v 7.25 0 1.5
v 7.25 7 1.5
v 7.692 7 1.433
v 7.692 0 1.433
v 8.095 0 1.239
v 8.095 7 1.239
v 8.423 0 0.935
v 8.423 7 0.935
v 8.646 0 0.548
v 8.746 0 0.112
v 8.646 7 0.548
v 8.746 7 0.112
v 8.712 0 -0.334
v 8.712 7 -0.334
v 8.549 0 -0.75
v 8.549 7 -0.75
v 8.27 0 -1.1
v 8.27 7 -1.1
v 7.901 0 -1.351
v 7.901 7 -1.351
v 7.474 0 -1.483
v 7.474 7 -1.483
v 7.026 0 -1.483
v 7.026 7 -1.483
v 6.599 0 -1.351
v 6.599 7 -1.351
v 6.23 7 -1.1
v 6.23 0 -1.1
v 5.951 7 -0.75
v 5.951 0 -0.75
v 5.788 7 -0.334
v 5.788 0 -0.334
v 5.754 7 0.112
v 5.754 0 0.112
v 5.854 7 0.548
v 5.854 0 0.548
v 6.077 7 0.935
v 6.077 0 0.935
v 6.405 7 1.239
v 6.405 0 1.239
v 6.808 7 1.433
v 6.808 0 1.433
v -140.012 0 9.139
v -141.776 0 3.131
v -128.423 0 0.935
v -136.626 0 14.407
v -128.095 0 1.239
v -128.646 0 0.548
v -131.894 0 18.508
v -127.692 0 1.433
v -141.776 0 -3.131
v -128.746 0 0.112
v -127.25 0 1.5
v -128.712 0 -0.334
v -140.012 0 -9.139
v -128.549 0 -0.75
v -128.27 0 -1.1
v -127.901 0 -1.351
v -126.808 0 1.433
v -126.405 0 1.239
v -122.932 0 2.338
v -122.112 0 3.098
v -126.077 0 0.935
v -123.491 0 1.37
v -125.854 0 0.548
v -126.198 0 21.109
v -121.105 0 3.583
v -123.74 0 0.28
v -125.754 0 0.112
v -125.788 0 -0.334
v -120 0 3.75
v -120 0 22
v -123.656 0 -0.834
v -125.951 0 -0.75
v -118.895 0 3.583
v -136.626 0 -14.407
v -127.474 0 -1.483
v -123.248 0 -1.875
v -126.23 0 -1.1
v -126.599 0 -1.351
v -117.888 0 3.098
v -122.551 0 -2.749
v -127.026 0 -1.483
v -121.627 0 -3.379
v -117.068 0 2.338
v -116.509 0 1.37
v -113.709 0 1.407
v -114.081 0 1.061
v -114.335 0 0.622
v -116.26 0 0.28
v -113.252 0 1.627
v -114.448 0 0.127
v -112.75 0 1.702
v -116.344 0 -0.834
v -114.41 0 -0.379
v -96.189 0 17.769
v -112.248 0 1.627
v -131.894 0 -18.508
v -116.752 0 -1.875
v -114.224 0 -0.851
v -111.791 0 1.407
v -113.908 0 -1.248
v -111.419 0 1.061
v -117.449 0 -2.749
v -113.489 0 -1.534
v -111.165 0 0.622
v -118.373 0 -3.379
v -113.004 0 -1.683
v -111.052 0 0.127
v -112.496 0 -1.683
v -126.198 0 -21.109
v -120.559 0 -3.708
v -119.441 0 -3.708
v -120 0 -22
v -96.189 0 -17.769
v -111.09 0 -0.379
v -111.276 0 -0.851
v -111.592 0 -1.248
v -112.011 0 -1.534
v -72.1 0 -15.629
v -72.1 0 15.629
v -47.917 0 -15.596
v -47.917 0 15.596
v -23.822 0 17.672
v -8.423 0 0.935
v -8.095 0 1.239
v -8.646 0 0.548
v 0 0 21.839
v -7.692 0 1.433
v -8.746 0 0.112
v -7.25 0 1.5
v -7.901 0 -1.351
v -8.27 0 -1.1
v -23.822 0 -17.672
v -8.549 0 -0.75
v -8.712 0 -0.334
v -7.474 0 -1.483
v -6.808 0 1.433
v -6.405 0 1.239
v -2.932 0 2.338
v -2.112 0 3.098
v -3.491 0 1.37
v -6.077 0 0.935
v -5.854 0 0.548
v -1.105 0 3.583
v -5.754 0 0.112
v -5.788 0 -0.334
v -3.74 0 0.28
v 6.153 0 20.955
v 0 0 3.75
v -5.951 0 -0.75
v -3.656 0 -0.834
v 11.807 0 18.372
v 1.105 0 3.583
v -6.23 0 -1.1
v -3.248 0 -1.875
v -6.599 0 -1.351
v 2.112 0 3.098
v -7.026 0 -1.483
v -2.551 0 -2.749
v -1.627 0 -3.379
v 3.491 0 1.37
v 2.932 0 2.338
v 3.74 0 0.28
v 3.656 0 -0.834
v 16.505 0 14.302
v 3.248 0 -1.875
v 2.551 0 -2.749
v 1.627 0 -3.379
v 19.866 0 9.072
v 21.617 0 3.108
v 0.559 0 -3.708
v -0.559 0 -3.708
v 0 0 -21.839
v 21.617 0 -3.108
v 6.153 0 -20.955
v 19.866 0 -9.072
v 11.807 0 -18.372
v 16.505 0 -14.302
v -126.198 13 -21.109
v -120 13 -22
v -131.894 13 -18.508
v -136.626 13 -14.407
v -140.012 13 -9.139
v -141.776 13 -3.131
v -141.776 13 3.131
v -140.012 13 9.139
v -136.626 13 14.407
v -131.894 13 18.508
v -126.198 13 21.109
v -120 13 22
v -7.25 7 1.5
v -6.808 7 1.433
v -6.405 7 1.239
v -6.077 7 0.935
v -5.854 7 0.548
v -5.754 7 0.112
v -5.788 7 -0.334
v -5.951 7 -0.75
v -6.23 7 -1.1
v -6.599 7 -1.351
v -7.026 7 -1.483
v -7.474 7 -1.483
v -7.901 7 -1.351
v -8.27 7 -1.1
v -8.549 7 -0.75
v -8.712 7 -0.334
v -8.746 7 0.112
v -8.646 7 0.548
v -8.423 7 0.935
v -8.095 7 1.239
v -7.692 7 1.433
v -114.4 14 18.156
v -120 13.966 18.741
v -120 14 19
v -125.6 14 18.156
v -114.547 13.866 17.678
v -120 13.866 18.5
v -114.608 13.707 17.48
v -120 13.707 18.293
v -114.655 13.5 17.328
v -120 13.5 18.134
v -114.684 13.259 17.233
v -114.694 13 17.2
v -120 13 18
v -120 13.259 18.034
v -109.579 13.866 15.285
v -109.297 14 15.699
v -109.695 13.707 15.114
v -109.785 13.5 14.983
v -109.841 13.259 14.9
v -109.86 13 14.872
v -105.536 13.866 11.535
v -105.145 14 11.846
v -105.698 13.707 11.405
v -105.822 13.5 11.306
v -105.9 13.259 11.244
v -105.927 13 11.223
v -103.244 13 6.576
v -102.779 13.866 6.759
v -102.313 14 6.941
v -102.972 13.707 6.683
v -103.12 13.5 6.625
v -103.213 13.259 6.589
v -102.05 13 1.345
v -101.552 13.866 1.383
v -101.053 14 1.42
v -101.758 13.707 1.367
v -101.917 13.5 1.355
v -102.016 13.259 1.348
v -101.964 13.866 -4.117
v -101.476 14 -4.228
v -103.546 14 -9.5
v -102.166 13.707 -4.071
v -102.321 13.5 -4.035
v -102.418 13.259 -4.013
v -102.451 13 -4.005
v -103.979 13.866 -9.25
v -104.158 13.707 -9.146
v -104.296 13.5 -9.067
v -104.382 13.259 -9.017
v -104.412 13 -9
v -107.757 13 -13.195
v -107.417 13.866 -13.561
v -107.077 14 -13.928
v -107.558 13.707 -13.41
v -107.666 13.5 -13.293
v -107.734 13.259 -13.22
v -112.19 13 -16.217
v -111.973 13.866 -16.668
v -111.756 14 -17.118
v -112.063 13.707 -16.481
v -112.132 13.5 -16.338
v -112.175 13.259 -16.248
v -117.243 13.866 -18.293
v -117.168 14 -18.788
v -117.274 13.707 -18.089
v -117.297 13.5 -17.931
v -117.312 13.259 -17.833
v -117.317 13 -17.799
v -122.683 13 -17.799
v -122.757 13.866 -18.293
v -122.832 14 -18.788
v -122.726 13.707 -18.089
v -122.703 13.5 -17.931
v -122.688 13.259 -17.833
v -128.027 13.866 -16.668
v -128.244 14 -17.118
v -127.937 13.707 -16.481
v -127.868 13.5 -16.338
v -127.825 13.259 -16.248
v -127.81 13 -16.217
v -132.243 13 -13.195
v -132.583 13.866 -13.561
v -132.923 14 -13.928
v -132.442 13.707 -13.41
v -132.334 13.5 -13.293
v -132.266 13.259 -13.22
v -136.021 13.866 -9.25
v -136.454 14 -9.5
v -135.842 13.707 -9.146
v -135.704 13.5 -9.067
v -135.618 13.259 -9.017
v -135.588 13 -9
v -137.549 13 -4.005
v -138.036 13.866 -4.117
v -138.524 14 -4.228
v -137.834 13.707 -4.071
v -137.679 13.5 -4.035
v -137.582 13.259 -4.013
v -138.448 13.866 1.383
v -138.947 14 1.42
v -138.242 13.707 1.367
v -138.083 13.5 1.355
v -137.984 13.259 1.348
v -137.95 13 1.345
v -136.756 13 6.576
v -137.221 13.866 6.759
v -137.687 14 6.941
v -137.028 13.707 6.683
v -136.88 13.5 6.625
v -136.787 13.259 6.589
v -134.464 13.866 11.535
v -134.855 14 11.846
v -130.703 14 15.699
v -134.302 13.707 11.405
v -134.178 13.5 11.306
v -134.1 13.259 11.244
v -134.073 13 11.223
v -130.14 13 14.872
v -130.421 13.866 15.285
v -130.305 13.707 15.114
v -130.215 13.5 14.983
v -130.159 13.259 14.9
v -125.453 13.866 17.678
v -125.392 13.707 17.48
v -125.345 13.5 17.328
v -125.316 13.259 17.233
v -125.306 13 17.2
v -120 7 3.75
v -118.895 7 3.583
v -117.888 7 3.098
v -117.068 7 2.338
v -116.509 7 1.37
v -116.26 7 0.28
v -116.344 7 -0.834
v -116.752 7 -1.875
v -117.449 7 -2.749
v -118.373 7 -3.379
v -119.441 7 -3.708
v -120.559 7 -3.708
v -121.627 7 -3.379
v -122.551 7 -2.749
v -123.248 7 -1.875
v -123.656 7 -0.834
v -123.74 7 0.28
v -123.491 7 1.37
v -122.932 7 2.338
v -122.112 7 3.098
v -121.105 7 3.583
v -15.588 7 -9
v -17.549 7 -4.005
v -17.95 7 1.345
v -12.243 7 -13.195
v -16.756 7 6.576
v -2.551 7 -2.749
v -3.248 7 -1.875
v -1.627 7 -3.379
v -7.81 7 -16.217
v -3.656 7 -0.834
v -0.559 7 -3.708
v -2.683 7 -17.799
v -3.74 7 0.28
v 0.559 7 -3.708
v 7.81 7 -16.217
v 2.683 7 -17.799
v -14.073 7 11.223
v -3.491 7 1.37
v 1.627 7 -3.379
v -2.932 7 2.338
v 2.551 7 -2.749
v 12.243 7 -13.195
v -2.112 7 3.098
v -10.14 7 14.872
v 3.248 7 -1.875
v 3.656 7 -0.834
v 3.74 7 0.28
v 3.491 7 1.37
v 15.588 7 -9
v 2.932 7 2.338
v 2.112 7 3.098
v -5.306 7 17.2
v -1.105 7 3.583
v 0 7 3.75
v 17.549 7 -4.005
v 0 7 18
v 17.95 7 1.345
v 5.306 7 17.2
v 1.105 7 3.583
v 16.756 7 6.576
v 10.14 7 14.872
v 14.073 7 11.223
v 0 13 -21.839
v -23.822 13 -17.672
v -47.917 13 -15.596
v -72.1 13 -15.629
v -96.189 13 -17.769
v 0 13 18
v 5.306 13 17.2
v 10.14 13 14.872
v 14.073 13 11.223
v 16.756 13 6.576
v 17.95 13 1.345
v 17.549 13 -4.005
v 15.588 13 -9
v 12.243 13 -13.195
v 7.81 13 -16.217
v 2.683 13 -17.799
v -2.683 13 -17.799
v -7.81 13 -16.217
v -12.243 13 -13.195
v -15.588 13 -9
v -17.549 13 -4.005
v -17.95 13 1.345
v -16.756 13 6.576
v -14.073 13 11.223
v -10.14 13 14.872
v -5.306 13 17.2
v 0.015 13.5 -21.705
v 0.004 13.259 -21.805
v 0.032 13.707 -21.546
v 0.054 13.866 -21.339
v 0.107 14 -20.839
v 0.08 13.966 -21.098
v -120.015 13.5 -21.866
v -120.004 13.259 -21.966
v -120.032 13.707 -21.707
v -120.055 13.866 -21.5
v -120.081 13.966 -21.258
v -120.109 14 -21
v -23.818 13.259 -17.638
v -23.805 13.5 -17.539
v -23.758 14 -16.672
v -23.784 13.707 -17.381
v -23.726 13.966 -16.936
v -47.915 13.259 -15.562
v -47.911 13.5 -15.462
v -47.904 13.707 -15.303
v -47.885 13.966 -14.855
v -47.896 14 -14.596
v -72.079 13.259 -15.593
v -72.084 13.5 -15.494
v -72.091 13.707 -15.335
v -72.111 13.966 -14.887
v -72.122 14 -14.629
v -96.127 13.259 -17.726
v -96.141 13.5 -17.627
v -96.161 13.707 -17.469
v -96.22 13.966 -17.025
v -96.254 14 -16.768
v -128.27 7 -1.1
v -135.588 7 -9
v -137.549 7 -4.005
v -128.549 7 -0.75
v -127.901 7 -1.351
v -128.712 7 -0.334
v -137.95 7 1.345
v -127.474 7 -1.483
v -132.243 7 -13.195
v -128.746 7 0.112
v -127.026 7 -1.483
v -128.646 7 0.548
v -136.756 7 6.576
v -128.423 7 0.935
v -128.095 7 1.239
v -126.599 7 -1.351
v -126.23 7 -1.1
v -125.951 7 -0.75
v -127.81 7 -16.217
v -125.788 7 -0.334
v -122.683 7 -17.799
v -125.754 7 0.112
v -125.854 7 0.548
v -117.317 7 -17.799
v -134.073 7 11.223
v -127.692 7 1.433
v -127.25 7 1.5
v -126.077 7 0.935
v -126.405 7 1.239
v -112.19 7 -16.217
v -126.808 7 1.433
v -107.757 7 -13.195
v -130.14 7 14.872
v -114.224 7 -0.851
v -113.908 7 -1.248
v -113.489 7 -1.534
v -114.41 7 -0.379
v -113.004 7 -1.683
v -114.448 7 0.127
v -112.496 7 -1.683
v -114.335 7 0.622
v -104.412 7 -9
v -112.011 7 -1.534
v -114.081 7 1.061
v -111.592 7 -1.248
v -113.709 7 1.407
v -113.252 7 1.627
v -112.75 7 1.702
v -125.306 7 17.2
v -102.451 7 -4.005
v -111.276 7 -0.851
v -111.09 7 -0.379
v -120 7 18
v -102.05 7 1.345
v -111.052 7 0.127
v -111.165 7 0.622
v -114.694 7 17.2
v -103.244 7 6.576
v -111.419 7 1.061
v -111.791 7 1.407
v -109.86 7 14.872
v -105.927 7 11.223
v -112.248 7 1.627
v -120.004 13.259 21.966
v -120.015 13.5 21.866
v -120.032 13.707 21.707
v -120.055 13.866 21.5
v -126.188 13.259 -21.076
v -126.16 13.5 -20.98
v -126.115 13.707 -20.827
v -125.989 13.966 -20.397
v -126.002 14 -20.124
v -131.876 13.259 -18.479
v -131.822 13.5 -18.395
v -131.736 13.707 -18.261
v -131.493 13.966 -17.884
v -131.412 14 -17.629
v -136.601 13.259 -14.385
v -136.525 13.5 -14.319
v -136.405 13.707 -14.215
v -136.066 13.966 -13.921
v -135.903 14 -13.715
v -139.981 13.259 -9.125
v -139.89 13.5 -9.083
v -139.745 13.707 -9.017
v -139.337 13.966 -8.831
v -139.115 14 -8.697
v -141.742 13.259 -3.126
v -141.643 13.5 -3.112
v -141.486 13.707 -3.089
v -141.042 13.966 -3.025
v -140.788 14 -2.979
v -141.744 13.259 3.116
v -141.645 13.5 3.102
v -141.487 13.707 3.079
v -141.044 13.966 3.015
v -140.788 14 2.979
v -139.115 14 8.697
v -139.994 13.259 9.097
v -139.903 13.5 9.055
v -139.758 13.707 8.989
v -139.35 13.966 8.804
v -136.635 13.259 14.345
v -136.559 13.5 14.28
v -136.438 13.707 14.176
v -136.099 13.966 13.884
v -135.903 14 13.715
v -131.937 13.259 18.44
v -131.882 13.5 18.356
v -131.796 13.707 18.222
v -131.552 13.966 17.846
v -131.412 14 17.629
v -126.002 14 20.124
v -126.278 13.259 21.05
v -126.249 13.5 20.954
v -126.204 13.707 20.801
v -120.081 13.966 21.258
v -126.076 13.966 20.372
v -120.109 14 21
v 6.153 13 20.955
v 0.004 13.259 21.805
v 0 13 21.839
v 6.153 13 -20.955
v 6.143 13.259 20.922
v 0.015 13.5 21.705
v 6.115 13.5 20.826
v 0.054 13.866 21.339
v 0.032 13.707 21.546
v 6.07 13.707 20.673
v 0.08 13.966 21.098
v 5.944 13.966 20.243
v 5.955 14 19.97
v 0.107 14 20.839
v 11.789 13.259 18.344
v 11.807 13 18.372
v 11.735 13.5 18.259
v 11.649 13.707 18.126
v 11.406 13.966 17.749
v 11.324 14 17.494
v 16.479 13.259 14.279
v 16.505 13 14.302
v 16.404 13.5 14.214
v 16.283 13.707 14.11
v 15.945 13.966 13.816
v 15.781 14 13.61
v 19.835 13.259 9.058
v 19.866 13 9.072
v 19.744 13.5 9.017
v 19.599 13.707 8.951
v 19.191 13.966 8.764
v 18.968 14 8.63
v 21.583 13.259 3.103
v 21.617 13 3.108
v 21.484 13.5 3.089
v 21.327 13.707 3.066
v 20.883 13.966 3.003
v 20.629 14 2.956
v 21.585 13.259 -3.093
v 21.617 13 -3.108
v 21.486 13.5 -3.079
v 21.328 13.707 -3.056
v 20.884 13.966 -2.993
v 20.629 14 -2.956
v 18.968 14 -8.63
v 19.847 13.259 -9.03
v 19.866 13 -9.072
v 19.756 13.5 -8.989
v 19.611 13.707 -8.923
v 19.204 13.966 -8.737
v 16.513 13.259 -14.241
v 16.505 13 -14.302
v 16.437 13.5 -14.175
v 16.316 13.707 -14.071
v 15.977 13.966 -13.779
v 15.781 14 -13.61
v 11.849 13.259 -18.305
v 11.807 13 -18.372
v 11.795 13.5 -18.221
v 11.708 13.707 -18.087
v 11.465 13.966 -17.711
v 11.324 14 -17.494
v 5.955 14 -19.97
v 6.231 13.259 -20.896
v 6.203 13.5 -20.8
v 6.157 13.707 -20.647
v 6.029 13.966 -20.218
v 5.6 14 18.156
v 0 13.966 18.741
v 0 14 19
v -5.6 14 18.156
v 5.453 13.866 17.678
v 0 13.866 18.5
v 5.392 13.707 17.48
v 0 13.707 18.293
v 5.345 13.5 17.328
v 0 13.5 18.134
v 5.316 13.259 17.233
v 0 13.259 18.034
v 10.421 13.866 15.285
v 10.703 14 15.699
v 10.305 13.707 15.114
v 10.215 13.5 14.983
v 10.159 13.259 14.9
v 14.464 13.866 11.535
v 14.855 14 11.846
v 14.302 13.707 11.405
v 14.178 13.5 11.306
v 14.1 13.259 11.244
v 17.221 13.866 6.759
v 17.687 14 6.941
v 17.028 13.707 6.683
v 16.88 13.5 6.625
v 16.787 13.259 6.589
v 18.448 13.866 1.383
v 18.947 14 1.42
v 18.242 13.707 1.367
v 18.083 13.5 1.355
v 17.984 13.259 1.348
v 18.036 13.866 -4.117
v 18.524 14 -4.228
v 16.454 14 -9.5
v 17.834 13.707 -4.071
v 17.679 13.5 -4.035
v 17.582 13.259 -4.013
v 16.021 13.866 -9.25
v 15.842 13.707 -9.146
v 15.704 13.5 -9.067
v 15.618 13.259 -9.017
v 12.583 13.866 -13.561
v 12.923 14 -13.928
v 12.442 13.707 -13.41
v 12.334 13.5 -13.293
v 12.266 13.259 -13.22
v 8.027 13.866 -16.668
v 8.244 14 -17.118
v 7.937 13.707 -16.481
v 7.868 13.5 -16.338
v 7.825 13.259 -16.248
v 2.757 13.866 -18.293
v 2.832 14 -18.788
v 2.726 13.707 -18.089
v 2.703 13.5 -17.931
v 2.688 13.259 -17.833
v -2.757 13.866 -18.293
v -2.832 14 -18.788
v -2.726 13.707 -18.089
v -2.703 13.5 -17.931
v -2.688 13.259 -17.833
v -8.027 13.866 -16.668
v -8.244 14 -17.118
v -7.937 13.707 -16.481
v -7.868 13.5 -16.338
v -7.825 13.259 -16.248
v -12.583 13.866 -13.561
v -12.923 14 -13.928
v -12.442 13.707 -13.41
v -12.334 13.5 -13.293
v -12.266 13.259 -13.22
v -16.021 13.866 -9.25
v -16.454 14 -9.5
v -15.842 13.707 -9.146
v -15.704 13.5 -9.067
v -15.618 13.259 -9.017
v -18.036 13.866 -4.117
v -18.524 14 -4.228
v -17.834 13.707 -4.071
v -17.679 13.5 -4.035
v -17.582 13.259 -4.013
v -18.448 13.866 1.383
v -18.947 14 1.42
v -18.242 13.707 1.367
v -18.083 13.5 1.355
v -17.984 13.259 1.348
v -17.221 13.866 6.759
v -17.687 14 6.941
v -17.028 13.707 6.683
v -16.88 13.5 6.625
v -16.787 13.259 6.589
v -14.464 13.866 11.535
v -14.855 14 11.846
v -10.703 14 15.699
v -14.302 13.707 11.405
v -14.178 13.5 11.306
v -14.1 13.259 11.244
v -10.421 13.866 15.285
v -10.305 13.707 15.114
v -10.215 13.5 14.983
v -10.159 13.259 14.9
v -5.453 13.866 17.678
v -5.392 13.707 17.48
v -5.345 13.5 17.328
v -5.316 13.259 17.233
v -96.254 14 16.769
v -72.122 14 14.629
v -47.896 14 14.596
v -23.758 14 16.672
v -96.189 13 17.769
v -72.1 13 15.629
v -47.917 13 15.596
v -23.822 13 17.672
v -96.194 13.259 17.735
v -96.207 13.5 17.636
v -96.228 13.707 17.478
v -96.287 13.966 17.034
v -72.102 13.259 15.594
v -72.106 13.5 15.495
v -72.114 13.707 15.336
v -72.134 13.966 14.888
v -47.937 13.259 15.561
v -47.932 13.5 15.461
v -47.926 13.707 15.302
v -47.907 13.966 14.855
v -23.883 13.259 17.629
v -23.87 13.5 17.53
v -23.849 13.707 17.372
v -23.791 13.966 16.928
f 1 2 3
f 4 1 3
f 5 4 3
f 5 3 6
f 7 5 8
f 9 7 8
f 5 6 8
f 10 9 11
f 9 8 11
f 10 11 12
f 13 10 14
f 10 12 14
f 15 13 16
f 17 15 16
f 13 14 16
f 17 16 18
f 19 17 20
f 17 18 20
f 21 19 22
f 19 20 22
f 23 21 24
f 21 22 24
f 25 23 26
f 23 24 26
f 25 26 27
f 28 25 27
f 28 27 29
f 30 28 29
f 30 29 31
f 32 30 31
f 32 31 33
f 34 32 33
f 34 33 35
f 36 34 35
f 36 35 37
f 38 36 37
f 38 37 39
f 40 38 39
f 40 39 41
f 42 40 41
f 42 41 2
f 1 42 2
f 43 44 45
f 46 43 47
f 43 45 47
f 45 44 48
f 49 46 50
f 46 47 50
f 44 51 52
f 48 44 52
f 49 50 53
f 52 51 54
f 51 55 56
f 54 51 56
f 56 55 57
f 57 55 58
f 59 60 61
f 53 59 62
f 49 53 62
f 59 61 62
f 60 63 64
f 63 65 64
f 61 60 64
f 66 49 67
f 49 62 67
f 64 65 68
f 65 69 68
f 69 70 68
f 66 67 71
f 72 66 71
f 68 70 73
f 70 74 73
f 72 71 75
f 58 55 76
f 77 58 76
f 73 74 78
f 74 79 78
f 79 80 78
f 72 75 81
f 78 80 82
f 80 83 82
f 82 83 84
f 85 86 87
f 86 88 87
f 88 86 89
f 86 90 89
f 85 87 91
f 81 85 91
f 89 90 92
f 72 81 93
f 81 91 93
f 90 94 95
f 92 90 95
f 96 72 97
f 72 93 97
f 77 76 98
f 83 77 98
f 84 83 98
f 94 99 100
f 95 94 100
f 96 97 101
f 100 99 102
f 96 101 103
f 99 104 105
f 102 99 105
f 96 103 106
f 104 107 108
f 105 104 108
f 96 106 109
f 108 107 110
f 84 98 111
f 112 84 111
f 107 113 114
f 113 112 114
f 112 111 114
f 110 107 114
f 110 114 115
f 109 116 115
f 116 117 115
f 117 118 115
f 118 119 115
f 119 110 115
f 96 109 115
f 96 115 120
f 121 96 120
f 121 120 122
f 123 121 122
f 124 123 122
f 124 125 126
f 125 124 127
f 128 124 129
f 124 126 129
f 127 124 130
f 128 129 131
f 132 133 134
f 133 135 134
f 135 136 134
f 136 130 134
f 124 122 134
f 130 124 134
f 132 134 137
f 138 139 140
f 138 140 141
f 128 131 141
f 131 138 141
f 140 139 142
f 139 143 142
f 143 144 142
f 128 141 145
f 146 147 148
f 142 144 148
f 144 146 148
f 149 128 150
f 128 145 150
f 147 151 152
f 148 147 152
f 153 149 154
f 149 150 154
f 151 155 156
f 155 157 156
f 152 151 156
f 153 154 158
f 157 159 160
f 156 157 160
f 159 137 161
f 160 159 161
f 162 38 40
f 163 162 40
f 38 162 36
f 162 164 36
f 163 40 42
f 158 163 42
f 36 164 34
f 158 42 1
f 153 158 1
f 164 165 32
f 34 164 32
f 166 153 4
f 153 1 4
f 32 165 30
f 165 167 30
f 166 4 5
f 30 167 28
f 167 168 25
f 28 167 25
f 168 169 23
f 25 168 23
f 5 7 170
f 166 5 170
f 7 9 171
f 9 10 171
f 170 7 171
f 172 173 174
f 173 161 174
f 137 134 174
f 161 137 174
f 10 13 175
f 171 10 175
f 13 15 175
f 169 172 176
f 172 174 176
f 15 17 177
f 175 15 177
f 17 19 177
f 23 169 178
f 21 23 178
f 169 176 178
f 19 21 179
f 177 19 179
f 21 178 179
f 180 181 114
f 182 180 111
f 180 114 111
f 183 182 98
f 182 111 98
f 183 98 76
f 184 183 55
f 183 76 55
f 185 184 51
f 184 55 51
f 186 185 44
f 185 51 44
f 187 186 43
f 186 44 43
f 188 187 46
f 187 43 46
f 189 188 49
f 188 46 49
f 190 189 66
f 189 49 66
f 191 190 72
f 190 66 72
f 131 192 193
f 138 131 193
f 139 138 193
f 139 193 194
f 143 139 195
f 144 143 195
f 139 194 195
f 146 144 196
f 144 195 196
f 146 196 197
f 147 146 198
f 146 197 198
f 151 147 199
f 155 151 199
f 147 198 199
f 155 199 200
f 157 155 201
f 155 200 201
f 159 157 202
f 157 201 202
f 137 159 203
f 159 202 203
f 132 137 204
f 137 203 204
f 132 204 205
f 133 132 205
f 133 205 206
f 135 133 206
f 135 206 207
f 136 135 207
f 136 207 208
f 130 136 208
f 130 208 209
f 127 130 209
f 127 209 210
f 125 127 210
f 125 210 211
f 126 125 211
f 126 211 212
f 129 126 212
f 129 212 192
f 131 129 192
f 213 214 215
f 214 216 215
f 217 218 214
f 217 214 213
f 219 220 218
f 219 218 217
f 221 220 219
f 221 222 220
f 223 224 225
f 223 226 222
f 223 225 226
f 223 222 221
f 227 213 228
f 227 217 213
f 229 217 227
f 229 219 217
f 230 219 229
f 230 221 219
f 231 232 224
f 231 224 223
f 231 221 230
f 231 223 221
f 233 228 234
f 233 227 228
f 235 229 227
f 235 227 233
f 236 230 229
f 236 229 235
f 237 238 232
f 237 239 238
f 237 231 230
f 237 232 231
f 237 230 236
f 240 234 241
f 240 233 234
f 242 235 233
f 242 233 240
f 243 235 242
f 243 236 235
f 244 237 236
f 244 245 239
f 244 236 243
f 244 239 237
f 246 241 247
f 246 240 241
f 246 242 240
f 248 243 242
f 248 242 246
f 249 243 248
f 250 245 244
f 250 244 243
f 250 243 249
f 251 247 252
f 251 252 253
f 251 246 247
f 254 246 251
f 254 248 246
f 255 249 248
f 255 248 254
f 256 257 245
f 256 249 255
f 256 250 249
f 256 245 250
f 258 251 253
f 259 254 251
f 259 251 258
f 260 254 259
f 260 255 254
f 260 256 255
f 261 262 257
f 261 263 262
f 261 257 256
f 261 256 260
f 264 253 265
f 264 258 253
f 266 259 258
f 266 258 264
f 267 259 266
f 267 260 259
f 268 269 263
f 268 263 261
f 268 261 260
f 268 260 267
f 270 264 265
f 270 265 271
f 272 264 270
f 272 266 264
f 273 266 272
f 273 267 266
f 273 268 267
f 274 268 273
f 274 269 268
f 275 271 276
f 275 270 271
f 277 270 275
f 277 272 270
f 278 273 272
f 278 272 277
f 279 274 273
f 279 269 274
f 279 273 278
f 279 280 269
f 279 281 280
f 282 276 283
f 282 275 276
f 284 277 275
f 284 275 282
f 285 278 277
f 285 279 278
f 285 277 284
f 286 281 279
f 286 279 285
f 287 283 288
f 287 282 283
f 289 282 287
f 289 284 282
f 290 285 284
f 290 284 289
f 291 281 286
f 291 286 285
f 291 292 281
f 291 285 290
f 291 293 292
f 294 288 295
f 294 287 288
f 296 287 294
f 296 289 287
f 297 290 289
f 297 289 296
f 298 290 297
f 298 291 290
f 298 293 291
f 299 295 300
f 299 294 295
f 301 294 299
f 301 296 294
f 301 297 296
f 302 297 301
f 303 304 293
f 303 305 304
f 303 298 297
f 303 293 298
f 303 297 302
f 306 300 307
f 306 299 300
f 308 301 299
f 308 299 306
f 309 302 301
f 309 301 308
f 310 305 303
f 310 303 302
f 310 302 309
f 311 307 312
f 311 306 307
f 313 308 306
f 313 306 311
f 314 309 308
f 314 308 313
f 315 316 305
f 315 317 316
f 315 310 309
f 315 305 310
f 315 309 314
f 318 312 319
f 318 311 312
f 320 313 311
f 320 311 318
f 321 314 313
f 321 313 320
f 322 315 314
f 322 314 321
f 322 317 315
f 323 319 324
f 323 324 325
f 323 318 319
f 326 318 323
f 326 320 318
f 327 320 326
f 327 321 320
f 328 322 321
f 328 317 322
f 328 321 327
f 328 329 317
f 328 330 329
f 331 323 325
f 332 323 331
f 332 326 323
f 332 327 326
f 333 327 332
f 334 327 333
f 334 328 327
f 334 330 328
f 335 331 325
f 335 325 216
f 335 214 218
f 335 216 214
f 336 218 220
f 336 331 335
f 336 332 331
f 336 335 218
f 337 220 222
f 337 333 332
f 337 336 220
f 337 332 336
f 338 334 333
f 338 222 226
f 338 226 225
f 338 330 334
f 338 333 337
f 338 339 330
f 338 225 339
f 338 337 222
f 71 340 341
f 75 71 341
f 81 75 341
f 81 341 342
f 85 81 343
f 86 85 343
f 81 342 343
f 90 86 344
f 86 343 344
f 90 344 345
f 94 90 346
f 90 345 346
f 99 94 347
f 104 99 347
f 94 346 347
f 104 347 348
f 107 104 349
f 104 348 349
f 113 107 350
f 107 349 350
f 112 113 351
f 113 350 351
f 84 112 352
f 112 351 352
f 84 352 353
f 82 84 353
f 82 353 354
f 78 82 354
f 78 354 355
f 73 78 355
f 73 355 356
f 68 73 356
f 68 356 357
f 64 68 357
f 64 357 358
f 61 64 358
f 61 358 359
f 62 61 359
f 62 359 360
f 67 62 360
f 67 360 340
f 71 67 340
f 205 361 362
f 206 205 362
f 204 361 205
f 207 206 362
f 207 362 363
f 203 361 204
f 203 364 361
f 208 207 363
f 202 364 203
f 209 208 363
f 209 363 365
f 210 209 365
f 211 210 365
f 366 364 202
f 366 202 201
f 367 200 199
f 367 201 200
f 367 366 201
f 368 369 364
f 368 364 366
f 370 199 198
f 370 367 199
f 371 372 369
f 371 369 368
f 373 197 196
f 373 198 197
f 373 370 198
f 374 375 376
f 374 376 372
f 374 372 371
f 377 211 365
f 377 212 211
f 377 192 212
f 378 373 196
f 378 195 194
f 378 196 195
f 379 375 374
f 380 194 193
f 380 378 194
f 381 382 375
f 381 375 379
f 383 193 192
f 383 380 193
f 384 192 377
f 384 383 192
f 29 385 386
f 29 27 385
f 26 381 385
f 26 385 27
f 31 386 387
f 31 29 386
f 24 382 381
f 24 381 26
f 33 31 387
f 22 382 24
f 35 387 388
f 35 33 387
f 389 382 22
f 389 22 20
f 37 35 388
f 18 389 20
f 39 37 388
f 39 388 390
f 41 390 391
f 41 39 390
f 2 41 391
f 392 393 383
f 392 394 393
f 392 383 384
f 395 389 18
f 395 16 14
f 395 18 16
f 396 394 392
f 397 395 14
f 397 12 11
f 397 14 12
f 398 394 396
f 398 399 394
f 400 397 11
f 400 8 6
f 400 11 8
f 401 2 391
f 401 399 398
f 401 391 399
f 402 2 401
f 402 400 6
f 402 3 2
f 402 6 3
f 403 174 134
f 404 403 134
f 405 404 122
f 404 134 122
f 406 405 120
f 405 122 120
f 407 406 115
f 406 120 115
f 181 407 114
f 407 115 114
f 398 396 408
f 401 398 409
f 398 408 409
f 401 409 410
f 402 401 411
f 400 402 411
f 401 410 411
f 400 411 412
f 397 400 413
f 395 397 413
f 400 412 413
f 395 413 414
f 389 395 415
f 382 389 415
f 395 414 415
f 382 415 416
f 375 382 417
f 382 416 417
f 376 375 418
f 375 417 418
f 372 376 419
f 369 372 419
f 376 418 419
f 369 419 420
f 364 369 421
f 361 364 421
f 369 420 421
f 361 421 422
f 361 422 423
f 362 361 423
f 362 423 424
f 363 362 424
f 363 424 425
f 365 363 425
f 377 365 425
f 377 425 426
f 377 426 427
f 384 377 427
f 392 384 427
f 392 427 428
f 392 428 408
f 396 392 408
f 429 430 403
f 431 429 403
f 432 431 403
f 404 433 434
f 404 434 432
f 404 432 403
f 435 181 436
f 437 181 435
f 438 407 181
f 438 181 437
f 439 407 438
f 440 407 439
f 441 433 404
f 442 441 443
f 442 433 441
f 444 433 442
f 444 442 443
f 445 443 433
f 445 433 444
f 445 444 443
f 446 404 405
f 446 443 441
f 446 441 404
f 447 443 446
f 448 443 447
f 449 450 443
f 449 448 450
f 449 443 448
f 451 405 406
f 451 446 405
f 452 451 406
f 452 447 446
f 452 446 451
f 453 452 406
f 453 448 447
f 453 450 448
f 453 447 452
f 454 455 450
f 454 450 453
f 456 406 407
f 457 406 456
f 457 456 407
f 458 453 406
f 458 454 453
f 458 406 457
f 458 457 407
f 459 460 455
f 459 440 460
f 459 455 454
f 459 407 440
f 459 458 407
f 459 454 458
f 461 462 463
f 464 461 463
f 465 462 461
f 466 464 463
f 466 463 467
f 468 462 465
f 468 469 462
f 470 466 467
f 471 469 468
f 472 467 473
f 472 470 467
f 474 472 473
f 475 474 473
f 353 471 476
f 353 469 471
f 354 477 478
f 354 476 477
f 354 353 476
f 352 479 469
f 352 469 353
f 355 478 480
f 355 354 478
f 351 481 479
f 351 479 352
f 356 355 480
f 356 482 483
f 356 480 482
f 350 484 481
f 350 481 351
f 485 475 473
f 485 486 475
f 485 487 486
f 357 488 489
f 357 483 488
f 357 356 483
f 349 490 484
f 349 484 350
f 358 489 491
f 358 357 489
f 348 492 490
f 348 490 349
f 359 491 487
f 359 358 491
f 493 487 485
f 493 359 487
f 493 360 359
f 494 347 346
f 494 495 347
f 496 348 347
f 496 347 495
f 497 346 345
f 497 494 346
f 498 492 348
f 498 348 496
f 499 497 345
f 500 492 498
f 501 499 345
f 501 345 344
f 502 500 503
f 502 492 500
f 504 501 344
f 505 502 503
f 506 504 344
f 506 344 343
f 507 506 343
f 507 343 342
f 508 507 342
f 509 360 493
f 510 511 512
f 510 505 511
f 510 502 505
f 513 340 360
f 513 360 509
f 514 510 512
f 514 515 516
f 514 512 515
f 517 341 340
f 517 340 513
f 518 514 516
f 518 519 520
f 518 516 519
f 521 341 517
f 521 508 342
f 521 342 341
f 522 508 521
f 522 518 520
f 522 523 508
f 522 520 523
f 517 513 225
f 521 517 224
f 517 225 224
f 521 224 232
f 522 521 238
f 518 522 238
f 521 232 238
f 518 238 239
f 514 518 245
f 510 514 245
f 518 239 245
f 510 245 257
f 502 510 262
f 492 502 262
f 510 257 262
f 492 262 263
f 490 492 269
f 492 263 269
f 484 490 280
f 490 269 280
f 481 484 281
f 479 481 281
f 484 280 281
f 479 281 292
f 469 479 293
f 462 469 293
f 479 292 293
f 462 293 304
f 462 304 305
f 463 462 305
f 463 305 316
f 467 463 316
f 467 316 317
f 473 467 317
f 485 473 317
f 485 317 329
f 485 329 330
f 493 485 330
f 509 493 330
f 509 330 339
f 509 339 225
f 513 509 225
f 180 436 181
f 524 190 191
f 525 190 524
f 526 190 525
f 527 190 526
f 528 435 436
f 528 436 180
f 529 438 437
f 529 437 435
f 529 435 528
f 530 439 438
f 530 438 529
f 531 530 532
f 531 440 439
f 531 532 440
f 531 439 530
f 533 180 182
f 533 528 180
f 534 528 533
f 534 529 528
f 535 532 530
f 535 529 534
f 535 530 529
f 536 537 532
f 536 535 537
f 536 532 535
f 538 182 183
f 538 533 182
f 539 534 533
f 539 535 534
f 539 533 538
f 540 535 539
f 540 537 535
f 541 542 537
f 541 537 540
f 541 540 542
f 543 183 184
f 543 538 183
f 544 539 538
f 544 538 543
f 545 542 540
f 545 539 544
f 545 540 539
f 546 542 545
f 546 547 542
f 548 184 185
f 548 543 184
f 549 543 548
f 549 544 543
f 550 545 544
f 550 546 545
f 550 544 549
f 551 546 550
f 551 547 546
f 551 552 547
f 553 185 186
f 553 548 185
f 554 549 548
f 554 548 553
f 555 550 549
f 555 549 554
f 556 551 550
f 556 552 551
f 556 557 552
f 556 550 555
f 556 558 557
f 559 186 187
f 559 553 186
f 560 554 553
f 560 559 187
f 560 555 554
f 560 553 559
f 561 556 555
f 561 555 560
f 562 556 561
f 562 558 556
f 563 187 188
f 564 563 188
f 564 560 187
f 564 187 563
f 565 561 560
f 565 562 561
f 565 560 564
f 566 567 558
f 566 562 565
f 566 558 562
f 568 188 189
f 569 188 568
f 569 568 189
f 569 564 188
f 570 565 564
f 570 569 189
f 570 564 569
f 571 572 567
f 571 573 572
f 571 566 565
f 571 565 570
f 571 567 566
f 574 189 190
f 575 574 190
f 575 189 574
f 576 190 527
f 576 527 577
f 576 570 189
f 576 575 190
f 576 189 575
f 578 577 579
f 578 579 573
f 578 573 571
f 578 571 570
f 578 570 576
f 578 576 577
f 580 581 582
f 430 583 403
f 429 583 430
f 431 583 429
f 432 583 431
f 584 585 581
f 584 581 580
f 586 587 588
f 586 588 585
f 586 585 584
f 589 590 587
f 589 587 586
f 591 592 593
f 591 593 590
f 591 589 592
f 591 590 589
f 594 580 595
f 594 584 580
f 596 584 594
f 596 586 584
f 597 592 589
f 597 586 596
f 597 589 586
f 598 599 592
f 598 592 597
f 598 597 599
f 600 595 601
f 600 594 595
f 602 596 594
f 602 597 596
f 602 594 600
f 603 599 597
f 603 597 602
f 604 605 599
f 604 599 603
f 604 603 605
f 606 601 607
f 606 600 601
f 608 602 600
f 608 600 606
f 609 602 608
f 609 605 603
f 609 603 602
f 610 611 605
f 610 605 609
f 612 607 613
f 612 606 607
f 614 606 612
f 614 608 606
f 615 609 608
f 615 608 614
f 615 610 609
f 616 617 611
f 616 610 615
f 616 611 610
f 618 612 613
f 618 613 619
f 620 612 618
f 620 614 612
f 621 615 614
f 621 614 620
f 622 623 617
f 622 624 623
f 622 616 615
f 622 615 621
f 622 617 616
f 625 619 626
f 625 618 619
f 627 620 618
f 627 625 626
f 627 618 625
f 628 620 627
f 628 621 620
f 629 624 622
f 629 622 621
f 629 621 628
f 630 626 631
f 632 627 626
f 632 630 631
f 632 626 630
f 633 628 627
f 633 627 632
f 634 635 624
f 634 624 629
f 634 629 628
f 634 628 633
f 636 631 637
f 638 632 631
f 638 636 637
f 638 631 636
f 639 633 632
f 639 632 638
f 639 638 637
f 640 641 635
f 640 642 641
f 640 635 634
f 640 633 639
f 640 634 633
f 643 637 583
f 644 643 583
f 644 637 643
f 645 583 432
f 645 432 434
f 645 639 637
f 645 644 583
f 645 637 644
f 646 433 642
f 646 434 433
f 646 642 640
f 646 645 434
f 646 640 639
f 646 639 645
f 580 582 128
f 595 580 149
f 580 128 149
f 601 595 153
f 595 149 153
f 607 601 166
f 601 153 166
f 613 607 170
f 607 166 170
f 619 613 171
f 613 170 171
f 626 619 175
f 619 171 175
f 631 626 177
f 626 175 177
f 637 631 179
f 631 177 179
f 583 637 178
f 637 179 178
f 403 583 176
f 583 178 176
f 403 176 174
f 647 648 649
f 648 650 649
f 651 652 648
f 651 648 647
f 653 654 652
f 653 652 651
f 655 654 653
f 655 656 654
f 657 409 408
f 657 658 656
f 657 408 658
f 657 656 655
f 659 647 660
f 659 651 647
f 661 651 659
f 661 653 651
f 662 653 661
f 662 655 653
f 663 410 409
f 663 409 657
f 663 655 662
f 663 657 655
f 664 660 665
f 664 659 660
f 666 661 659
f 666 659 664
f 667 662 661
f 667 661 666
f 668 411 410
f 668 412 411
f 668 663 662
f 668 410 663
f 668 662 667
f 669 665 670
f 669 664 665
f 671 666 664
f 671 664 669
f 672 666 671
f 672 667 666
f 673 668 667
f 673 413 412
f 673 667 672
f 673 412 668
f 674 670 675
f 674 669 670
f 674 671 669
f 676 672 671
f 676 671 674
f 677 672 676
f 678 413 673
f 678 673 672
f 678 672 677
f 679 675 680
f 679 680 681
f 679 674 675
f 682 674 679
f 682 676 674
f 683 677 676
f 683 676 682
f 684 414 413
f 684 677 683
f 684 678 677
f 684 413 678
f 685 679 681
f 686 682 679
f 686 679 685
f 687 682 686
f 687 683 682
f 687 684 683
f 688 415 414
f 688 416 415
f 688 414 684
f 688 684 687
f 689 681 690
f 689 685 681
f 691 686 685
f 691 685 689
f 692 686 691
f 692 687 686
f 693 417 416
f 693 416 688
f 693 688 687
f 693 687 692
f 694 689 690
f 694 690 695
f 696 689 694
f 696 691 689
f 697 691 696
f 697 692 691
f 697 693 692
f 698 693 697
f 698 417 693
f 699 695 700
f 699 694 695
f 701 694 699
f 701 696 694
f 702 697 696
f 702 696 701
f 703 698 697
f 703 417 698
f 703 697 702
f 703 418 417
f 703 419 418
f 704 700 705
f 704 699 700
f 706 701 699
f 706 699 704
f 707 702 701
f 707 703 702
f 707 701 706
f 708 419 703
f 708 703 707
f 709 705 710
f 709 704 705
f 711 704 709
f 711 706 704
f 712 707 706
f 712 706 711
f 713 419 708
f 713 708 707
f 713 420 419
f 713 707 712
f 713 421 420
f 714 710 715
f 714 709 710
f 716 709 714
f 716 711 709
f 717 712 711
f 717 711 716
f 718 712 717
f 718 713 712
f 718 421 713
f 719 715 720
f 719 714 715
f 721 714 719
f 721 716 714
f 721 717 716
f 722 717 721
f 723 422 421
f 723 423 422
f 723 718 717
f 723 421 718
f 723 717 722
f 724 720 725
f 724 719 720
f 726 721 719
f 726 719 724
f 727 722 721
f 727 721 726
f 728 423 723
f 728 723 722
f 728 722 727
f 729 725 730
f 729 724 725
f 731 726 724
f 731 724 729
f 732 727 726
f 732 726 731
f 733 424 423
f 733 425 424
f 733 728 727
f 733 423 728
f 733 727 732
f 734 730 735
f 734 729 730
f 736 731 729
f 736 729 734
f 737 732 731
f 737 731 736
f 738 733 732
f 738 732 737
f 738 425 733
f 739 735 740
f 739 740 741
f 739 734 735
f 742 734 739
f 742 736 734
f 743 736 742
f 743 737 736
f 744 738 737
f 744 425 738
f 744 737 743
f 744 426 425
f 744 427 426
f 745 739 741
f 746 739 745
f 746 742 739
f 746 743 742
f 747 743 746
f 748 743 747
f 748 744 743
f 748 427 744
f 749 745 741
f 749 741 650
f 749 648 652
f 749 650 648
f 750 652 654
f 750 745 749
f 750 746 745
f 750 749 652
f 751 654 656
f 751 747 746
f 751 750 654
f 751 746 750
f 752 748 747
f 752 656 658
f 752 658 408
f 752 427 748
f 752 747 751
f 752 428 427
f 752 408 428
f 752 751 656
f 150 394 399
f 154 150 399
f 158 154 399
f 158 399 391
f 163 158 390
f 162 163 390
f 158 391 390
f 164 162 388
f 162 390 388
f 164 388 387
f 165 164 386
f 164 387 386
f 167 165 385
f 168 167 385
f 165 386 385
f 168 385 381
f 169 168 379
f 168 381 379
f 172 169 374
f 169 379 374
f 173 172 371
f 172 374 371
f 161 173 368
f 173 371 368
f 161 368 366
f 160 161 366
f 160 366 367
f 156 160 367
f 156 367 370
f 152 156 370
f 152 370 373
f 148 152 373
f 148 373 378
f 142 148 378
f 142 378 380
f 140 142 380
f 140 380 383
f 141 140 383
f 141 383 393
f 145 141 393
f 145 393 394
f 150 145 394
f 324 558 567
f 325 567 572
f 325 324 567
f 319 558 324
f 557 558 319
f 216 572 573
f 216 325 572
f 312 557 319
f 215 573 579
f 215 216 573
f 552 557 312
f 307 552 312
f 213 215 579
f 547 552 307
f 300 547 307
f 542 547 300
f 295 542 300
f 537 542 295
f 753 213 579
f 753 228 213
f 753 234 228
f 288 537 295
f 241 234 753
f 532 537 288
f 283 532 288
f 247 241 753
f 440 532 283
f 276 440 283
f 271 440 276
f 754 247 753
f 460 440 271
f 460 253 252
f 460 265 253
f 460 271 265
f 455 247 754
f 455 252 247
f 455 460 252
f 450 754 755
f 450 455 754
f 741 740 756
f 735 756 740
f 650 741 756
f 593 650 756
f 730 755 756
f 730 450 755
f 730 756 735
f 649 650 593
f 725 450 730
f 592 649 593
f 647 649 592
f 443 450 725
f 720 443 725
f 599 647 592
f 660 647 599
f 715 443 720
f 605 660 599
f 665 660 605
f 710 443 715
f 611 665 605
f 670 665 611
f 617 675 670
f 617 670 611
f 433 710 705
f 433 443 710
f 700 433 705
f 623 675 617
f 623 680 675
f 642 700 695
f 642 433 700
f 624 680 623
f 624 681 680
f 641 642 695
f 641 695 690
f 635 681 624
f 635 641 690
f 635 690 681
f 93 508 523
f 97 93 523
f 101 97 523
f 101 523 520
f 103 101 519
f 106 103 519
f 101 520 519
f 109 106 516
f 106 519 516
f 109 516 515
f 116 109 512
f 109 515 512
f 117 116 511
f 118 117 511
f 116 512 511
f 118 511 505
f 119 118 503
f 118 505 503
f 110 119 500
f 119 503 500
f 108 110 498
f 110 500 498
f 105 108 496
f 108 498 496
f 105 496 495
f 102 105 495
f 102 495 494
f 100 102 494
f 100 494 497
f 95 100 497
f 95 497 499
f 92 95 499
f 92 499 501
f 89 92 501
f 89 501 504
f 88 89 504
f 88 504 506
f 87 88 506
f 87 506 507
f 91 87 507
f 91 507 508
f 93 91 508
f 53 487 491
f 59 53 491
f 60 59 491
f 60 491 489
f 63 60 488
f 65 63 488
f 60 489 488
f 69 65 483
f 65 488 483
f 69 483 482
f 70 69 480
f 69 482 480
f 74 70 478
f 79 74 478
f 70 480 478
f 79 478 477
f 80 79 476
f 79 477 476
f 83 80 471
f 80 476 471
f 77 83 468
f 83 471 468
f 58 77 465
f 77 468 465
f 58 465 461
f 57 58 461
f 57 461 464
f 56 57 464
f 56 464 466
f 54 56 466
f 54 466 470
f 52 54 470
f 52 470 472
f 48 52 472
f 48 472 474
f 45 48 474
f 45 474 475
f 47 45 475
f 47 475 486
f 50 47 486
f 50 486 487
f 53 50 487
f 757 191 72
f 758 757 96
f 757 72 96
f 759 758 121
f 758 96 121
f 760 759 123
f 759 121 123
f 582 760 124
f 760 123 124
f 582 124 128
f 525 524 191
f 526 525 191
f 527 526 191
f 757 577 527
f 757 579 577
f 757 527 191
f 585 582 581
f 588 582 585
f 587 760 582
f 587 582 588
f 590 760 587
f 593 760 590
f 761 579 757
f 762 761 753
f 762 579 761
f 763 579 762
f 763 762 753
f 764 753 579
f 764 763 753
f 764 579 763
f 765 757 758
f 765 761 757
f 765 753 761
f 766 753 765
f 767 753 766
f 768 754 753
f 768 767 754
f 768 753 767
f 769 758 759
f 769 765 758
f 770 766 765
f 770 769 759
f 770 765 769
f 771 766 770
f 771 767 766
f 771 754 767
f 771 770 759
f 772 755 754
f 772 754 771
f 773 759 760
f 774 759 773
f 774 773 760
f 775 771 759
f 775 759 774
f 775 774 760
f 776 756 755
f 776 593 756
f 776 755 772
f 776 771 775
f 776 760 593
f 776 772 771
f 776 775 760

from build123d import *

# Parameters (mm, degrees)
SALIENTE_EXTRUIR7_DEPTH = 14
CROQUIS4_R              = 18
CORTAR_EXTRUIR1_DEPTH   = 7
CROQUIS5_R              = 3.75
CROQUIS5_R_2            = 1.5
CROQUIS5_R_3            = 1.702426791
CORTAR_EXTRUIR3_DEPTH   = 144.864519601
CROQUIS6_R              = 3.75
CROQUIS6_R_2            = 1.5
CORTAR_EXTRUIR4_DEPTH   = 144.864519601
REDONDEO2_R             = 1


with BuildPart() as part:
    # Croquis1 → Saliente-Extruir7 (new body)
    with BuildSketch(Plane(origin=(0, 0, 0), x_dir=(1, 0, 0), z_dir=(0, 1, 0))):
        with BuildLine():
            ThreePointArc((-120, 22), (-142, 0), (-120, -22))
            ThreePointArc((-120, -22), (-60.008802525, -15.348556021), (0, -21.839249444))
            ThreePointArc((0, -21.839249444), (21.839249444, 0), (0, 21.839249444))
            ThreePointArc((0, 21.839249444), (-60.008802533, 15.348549982), (-120, 22))
        make_face()
    extrude(amount=SALIENTE_EXTRUIR7_DEPTH)

    # Croquis4 → Cortar-Extruir1 (cut)
    with BuildSketch(Plane(origin=(0, 14, 0), x_dir=(1, 0, 0), z_dir=(0, 1, 0))):
        with Locations(Location((-120, 0, 0), (0, 0, 270))):
            Circle(CROQUIS4_R)
        with Locations(Location((0, 0, 0), (0, 0, 270))):
            Circle(CROQUIS4_R)
    extrude(amount=-CORTAR_EXTRUIR1_DEPTH, mode=Mode.SUBTRACT)

    # Croquis5 → Cortar-Extruir3 (cut, through all)
    with BuildSketch(Plane(origin=(0, 7, 0), x_dir=(1, 0, 0), z_dir=(0, 1, 0))):
        with Locations(Location((-120, 0, 0), (0, 0, 270))):
            Circle(CROQUIS5_R)
        with Locations(Location((-127.25, 0, 0), (0, 0, 270))):
            Circle(CROQUIS5_R_2)
        with Locations(Location((-112.75, 0, 0), (0, 0, 270))):
            Circle(CROQUIS5_R_3)
    extrude(amount=-CORTAR_EXTRUIR3_DEPTH, mode=Mode.SUBTRACT)

    # Croquis6 → Cortar-Extruir4 (cut, through all)
    with BuildSketch(Plane(origin=(0, 7, 0), x_dir=(1, 0, 0), z_dir=(0, 1, 0))):
        with Locations(Location((0, 0, 0), (0, 0, 270))):
            Circle(CROQUIS6_R)
        with Locations(Location((7.25, 0, 0), (0, 0, 270))):
            Circle(CROQUIS6_R_2)
        with Locations(Location((-7.25, 0, 0), (0, 0, 270))):
            Circle(CROQUIS6_R_2)
    extrude(amount=-CORTAR_EXTRUIR4_DEPTH, mode=Mode.SUBTRACT)

    # Redondeo2
    # the kernel refuses this fillet: 1 mm, written as the material it takes off along each edge
    with BuildSketch(Plane(origin=(-59.637450549, 14, 292.562134942), x_dir=(-0.226540467768197, 0, -0.9740017538297179), z_dir=(-0.9740017538297179, 0, 0.226540467768197))) as redondeo2_piece_1:
        with BuildLine():
            CenterArc((277.21382765 + REDONDEO2_R, REDONDEO2_R), REDONDEO2_R, 180, 90)
            Line((277.21382765 + REDONDEO2_R, 0), (277.21382765, 0))
            Line((277.21382765, 0), (277.21382765, REDONDEO2_R))
        make_face()
    revolve(axis=Axis((-59.637450549, 14, 292.562134942), (0, -1, 0)), revolution_arc=26.03345413, mode=Mode.SUBTRACT)
    with BuildSketch(Plane(origin=(-120, 14, 0), x_dir=(0, 0, 1), z_dir=(-1, 0, 0))) as redondeo2_piece_2:
        with BuildLine():
            CenterArc((18 + REDONDEO2_R, -REDONDEO2_R), REDONDEO2_R, 90, 90)
            Line((18, -REDONDEO2_R), (18, 0))
            Line((18, 0), (18 + REDONDEO2_R, 0))
        make_face()
    revolve(axis=Axis((-120, 14, 0), (0, 1, 0)), mode=Mode.SUBTRACT)
    with BuildSketch(Plane(origin=(0, 14, 0), x_dir=(-0.11440584030720254, 0, 0.993434096306143), z_dir=(-0.993434096306143, 0, -0.11440584030720254))) as redondeo2_piece_3:
        with BuildLine():
            CenterArc((21.839249444 - REDONDEO2_R, -REDONDEO2_R), REDONDEO2_R, 0, 90)
            Line((21.839249444 - REDONDEO2_R, 0), (21.839249444, 0))
            Line((21.839249444, 0), (21.839249444, -REDONDEO2_R))
        make_face()
    revolve(axis=Axis((0, 14, 0), (0, 1, 0)), revolution_arc=193.138712049, mode=Mode.SUBTRACT)
    with BuildSketch(Plane(origin=(0, 14, 0), x_dir=(0, 0, 1), z_dir=(-1, 0, 0))) as redondeo2_piece_4:
        with BuildLine():
            CenterArc((18 + REDONDEO2_R, -REDONDEO2_R), REDONDEO2_R, 90, 90)
            Line((18, -REDONDEO2_R), (18, 0))
            Line((18, 0), (18 + REDONDEO2_R, 0))
        make_face()
    revolve(axis=Axis((0, 14, 0), (0, 1, 0)), mode=Mode.SUBTRACT)
    with BuildSketch(Plane(origin=(-59.637450891, 14, -292.561880174), x_dir=(0.22393033908793564, 0, 0.9746051524776391), z_dir=(0.9746051524776391, 0, -0.22393033908793564))) as redondeo2_piece_5:
        with BuildLine():
            CenterArc((277.213578921 + REDONDEO2_R, REDONDEO2_R), REDONDEO2_R, 180, 90)
            Line((277.213578921 + REDONDEO2_R, 0), (277.213578921, 0))
            Line((277.213578921, 0), (277.213578921, REDONDEO2_R))
        make_face()
    revolve(axis=Axis((-59.637450891, 14, -292.561880174), (0, -1, 0)), revolution_arc=26.033477851, mode=Mode.SUBTRACT)
    with BuildSketch(Plane(origin=(-120, 14, 0), x_dir=(0.11357352107267756, 0, -0.9935295945824433), z_dir=(0.9935295945824433, 0, 0.11357352107267756))) as redondeo2_piece_6:
        with BuildLine():
            CenterArc((22 - REDONDEO2_R, -REDONDEO2_R), REDONDEO2_R, 0, 90)
            Line((22, -REDONDEO2_R), (22, 0))
            Line((22, 0), (22 - REDONDEO2_R, 0))
        make_face()
    revolve(axis=Axis((-120, 14, 0), (0, 1, 0)), revolution_arc=193.042709536, mode=Mode.SUBTRACT)


solid = part.part
